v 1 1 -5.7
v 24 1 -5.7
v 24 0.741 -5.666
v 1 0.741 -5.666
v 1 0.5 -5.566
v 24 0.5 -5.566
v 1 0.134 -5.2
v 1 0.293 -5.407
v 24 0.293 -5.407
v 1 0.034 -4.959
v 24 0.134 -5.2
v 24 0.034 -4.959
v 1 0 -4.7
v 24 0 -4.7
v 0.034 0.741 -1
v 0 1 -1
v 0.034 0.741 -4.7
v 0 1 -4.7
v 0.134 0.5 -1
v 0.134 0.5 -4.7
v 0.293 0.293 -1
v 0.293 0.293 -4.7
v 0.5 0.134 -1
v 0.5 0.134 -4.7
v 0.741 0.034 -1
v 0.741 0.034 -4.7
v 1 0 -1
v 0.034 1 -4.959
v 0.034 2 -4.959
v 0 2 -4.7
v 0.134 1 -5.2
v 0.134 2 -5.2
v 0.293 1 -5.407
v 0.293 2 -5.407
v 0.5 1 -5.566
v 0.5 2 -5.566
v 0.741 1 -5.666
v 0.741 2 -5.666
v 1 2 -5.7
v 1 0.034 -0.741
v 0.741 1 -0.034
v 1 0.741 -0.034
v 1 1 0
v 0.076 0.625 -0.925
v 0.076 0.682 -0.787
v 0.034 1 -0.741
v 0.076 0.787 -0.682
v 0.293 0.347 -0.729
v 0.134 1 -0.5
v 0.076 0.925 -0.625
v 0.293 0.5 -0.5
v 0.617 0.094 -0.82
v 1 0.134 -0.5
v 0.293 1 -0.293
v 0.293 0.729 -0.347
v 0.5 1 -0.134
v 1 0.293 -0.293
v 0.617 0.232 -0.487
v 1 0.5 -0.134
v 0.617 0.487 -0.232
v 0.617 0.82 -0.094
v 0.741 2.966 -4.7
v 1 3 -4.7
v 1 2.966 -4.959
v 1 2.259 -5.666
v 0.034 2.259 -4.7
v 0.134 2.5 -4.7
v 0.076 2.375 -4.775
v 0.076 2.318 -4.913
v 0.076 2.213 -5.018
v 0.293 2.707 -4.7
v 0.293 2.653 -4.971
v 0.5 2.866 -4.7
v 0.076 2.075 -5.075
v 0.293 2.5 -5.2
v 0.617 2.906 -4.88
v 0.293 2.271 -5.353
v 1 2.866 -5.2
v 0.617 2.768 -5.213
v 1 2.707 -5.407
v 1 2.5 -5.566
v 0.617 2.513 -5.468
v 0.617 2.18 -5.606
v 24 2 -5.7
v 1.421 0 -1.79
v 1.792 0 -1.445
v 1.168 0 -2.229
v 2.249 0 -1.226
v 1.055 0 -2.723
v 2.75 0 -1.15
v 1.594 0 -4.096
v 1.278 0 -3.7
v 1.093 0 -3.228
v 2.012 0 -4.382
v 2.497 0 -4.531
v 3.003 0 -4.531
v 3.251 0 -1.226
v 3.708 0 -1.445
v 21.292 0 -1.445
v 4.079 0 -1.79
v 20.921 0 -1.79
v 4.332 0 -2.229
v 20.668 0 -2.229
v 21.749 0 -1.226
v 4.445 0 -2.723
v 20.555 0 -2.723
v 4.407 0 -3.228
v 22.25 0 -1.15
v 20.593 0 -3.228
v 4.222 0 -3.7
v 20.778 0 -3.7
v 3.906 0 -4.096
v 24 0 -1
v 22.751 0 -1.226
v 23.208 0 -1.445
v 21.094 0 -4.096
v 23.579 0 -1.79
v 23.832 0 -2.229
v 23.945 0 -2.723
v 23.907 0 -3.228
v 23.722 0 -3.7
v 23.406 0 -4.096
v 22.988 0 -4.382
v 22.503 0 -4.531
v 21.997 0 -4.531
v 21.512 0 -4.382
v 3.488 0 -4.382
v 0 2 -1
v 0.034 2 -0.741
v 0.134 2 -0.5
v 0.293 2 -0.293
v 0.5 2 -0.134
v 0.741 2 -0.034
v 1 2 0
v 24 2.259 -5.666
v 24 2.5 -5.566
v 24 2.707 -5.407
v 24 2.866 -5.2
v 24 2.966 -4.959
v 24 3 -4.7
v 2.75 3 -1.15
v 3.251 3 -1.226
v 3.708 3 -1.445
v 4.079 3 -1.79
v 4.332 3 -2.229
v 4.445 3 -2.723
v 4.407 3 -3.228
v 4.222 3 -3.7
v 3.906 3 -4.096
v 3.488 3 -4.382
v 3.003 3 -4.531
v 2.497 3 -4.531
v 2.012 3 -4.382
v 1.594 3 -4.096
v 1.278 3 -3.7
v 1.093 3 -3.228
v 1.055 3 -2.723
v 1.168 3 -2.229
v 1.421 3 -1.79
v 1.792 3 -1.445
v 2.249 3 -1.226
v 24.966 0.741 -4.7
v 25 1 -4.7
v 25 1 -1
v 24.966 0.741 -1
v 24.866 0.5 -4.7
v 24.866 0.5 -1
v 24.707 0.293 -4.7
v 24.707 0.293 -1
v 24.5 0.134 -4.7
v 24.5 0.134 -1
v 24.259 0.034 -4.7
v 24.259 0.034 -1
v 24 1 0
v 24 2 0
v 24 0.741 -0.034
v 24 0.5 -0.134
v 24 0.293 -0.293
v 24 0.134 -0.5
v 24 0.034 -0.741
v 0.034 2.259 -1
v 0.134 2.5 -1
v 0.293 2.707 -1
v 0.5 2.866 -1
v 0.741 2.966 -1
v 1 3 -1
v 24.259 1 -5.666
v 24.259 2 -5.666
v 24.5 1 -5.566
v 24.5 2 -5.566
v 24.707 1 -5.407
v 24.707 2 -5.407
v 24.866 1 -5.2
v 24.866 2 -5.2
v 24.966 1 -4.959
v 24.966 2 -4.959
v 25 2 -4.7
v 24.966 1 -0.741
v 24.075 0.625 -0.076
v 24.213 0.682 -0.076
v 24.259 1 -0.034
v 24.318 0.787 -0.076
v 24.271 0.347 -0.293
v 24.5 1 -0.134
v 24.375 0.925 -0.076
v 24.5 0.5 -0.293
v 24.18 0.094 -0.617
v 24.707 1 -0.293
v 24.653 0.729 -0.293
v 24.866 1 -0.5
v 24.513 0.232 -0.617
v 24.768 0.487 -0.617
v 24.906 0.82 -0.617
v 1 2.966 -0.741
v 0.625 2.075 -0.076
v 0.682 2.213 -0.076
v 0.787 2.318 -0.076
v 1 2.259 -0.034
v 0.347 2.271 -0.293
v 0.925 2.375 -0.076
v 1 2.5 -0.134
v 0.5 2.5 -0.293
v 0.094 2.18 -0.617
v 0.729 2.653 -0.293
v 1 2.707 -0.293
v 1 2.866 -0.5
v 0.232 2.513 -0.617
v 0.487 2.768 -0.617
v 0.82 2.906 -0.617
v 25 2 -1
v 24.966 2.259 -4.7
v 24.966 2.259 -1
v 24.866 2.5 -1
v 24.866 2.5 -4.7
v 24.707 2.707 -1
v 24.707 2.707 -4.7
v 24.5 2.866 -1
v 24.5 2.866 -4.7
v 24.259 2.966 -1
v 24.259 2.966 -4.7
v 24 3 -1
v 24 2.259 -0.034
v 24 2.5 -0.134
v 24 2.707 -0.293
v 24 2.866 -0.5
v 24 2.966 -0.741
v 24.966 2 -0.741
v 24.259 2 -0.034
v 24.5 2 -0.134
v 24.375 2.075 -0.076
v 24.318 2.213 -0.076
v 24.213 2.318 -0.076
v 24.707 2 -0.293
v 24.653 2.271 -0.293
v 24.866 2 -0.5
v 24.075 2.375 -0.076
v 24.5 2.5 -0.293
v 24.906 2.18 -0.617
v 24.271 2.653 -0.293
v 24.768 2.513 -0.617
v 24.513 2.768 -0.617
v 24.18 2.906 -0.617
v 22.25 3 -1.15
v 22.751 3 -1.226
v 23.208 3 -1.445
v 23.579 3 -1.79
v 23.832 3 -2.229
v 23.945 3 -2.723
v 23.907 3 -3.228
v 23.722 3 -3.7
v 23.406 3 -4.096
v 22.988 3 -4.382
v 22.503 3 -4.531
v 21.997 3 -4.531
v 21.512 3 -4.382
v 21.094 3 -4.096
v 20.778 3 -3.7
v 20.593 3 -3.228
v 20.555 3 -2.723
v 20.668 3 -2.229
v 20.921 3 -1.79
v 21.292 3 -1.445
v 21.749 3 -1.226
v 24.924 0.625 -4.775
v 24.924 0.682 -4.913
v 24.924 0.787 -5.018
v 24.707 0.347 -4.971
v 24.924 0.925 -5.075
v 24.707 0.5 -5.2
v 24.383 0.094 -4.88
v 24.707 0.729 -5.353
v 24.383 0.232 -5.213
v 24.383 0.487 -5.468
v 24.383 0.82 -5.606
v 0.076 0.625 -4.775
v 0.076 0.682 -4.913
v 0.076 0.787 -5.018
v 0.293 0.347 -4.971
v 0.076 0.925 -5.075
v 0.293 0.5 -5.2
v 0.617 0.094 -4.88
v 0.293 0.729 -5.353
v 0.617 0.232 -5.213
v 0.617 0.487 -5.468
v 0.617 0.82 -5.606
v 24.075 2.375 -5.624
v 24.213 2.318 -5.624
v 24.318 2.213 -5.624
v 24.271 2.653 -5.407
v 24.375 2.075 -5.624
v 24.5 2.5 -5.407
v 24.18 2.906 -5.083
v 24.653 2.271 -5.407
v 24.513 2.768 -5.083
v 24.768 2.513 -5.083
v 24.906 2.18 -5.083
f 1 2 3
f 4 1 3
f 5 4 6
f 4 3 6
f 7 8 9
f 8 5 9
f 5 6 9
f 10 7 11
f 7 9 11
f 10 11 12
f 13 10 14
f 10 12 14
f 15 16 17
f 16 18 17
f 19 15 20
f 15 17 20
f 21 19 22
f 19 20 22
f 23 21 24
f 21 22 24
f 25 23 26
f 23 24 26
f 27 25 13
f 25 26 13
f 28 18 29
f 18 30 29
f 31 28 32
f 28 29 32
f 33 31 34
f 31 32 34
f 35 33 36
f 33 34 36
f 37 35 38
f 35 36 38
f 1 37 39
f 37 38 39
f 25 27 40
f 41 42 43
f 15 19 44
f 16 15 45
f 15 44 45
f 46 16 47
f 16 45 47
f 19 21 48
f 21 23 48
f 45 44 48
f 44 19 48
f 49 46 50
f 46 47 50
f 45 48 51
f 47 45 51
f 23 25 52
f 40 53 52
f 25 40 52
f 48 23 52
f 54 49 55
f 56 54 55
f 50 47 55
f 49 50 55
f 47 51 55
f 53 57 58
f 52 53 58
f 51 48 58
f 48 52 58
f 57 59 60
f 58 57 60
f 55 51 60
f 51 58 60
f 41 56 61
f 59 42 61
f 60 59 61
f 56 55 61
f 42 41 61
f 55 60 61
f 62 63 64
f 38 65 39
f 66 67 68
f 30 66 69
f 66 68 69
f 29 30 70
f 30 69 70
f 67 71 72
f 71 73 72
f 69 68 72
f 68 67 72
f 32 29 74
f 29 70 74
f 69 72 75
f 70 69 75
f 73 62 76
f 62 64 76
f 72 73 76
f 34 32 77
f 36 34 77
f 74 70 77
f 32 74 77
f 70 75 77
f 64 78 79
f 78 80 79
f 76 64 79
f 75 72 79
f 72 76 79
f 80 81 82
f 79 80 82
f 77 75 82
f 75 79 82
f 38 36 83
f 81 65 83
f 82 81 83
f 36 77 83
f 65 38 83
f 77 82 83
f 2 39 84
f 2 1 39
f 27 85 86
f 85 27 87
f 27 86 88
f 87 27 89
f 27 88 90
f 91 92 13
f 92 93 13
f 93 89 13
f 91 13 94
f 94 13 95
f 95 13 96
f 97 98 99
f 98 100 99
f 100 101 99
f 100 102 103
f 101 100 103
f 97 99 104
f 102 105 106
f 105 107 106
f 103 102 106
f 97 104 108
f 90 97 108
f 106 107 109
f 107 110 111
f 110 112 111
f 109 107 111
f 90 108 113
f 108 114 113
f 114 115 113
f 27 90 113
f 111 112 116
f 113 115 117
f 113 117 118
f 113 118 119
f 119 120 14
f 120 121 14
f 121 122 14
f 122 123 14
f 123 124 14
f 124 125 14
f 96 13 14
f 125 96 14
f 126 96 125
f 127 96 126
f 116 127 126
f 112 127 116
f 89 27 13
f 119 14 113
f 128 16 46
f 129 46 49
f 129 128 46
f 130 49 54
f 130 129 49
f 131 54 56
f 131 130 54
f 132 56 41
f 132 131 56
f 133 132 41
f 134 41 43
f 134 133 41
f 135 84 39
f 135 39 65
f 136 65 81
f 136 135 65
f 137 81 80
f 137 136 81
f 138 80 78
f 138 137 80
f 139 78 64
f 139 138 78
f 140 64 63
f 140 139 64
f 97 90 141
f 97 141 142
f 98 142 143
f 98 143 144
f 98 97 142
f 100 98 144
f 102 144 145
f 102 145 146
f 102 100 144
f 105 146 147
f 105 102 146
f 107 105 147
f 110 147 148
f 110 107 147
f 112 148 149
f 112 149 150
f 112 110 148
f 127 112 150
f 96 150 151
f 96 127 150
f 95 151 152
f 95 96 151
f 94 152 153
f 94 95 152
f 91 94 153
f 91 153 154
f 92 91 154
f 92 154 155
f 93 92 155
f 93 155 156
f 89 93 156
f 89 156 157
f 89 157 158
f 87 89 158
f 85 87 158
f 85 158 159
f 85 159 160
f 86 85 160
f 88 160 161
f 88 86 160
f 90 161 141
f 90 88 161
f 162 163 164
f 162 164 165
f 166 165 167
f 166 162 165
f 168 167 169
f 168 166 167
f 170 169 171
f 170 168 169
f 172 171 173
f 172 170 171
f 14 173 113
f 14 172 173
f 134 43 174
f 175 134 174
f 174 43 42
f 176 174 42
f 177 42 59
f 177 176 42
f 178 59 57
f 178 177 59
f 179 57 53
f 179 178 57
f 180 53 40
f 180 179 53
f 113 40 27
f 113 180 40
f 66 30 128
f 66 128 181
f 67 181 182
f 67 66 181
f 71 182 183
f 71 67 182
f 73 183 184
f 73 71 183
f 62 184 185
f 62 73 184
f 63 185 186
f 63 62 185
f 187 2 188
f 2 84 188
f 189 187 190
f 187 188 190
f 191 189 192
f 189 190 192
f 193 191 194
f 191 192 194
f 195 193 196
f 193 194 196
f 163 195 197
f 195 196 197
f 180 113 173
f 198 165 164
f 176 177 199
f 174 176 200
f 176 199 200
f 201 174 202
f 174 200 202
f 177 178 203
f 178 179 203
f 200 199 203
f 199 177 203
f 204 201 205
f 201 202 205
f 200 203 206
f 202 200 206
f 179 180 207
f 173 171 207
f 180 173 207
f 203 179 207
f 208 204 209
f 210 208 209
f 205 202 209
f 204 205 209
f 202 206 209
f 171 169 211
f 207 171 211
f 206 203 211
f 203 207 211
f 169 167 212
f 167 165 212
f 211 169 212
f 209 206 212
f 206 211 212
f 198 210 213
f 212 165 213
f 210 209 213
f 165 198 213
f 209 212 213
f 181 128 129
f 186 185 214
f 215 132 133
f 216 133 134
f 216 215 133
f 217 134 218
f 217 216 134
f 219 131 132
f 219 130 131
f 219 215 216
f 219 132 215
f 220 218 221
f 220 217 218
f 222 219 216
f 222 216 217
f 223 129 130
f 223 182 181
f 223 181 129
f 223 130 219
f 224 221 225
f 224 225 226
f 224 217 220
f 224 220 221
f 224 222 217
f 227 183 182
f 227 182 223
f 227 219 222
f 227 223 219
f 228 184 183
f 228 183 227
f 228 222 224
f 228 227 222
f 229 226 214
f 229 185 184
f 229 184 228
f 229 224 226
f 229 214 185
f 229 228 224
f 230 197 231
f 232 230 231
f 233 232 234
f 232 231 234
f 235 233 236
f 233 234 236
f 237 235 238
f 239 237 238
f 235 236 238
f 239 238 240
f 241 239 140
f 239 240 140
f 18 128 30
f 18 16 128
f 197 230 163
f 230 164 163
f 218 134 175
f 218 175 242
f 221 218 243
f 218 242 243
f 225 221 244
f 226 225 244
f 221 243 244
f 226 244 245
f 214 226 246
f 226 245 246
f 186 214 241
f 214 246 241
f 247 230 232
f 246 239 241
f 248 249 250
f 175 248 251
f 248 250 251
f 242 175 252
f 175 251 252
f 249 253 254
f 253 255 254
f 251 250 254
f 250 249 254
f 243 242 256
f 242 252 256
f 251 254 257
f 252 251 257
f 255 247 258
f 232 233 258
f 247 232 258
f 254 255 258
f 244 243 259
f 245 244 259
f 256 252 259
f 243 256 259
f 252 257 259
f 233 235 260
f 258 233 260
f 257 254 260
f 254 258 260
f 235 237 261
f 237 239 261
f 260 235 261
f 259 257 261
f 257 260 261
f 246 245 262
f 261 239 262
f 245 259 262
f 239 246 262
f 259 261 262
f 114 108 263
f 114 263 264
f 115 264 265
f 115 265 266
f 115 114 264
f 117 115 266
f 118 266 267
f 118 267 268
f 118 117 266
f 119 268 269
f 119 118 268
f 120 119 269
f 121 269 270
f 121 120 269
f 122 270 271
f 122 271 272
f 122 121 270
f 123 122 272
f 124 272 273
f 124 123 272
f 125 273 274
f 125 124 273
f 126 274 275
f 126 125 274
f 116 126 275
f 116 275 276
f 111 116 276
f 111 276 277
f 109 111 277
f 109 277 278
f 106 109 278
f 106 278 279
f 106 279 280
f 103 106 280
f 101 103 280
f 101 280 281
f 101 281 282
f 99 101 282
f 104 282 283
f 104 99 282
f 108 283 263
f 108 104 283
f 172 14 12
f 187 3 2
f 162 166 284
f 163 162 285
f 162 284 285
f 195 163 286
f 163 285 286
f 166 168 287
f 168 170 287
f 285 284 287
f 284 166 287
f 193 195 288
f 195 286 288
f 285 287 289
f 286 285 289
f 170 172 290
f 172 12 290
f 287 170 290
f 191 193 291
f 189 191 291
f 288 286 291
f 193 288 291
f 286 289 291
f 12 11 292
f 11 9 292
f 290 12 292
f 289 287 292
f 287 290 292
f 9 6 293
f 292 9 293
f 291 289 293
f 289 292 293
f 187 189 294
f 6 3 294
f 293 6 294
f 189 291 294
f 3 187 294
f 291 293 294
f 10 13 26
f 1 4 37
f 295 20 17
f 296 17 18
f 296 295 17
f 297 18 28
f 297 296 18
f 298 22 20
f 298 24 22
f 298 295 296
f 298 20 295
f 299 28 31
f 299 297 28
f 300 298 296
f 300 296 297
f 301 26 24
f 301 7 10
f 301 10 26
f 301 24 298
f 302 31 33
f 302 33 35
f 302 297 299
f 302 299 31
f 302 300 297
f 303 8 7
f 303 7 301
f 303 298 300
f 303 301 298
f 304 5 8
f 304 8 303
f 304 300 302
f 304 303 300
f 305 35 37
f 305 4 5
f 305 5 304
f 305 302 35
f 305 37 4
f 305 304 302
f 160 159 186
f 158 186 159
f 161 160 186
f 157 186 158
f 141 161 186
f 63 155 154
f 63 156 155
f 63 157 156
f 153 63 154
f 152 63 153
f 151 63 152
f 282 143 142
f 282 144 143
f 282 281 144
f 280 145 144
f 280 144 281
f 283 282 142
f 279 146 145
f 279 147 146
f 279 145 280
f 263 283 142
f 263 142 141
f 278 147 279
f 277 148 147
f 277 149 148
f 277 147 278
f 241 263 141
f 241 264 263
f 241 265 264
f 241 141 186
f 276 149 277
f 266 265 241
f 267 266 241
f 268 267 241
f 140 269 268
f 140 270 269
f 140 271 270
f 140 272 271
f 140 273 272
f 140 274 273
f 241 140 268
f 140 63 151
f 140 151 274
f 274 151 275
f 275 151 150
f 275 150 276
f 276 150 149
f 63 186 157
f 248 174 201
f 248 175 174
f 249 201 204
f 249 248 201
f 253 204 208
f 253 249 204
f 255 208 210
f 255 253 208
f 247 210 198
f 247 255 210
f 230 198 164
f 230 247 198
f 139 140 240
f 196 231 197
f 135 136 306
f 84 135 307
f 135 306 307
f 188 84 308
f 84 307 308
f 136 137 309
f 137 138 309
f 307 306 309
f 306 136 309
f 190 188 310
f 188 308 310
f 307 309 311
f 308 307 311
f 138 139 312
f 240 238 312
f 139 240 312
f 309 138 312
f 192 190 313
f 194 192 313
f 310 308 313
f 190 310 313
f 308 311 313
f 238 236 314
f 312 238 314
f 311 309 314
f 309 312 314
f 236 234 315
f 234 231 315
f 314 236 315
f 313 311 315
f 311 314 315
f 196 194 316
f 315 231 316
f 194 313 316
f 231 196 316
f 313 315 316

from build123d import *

# Parameters (mm, degrees)
SKETCH1_W           = 25
SKETCH1_H           = 5.7
SKETCH1_R           = 1.7
BOSS_EXTRUDE1_DEPTH = 3
FILLET1_R           = 1


with BuildPart() as part:
    # Sketch1 → Boss-Extrude1 (new body)
    with BuildSketch(Plane(origin=(0, 0, 0), x_dir=(1, 0, 0), z_dir=(0, 1, 0))):
        with Locations((12.5, 2.85)):
            Rectangle(SKETCH1_W, SKETCH1_H)
        with Locations(Location((2.75, 2.85, 0), (0, 0, 270))):
            Circle(SKETCH1_R, mode=Mode.SUBTRACT)
        with Locations(Location((22.25, 2.85, 0), (0, 0, 270))):
            Circle(SKETCH1_R, mode=Mode.SUBTRACT)
    extrude(amount=BOSS_EXTRUDE1_DEPTH)

    # Fillet1
    fillet1_edges = [part.edges().sort_by_distance(p)[0] for p in [
        (25, 3, -2.85),
        (12.5, 3, -5.7),
        (0, 3, -2.85),
        (12.5, 0, -5.7),
        (25, 0, -2.85),
        (12.5, 0, 0),
        (0, 0, -2.85),
        (0, 1.5, -5.7),
        (25, 1.5, -5.7),
        (25, 1.5, 0),
        (0, 1.5, 0),
        (12.5, 3, 0),
    ]]
    fillet(fillet1_edges, radius=FILLET1_R)


solid = part.part
